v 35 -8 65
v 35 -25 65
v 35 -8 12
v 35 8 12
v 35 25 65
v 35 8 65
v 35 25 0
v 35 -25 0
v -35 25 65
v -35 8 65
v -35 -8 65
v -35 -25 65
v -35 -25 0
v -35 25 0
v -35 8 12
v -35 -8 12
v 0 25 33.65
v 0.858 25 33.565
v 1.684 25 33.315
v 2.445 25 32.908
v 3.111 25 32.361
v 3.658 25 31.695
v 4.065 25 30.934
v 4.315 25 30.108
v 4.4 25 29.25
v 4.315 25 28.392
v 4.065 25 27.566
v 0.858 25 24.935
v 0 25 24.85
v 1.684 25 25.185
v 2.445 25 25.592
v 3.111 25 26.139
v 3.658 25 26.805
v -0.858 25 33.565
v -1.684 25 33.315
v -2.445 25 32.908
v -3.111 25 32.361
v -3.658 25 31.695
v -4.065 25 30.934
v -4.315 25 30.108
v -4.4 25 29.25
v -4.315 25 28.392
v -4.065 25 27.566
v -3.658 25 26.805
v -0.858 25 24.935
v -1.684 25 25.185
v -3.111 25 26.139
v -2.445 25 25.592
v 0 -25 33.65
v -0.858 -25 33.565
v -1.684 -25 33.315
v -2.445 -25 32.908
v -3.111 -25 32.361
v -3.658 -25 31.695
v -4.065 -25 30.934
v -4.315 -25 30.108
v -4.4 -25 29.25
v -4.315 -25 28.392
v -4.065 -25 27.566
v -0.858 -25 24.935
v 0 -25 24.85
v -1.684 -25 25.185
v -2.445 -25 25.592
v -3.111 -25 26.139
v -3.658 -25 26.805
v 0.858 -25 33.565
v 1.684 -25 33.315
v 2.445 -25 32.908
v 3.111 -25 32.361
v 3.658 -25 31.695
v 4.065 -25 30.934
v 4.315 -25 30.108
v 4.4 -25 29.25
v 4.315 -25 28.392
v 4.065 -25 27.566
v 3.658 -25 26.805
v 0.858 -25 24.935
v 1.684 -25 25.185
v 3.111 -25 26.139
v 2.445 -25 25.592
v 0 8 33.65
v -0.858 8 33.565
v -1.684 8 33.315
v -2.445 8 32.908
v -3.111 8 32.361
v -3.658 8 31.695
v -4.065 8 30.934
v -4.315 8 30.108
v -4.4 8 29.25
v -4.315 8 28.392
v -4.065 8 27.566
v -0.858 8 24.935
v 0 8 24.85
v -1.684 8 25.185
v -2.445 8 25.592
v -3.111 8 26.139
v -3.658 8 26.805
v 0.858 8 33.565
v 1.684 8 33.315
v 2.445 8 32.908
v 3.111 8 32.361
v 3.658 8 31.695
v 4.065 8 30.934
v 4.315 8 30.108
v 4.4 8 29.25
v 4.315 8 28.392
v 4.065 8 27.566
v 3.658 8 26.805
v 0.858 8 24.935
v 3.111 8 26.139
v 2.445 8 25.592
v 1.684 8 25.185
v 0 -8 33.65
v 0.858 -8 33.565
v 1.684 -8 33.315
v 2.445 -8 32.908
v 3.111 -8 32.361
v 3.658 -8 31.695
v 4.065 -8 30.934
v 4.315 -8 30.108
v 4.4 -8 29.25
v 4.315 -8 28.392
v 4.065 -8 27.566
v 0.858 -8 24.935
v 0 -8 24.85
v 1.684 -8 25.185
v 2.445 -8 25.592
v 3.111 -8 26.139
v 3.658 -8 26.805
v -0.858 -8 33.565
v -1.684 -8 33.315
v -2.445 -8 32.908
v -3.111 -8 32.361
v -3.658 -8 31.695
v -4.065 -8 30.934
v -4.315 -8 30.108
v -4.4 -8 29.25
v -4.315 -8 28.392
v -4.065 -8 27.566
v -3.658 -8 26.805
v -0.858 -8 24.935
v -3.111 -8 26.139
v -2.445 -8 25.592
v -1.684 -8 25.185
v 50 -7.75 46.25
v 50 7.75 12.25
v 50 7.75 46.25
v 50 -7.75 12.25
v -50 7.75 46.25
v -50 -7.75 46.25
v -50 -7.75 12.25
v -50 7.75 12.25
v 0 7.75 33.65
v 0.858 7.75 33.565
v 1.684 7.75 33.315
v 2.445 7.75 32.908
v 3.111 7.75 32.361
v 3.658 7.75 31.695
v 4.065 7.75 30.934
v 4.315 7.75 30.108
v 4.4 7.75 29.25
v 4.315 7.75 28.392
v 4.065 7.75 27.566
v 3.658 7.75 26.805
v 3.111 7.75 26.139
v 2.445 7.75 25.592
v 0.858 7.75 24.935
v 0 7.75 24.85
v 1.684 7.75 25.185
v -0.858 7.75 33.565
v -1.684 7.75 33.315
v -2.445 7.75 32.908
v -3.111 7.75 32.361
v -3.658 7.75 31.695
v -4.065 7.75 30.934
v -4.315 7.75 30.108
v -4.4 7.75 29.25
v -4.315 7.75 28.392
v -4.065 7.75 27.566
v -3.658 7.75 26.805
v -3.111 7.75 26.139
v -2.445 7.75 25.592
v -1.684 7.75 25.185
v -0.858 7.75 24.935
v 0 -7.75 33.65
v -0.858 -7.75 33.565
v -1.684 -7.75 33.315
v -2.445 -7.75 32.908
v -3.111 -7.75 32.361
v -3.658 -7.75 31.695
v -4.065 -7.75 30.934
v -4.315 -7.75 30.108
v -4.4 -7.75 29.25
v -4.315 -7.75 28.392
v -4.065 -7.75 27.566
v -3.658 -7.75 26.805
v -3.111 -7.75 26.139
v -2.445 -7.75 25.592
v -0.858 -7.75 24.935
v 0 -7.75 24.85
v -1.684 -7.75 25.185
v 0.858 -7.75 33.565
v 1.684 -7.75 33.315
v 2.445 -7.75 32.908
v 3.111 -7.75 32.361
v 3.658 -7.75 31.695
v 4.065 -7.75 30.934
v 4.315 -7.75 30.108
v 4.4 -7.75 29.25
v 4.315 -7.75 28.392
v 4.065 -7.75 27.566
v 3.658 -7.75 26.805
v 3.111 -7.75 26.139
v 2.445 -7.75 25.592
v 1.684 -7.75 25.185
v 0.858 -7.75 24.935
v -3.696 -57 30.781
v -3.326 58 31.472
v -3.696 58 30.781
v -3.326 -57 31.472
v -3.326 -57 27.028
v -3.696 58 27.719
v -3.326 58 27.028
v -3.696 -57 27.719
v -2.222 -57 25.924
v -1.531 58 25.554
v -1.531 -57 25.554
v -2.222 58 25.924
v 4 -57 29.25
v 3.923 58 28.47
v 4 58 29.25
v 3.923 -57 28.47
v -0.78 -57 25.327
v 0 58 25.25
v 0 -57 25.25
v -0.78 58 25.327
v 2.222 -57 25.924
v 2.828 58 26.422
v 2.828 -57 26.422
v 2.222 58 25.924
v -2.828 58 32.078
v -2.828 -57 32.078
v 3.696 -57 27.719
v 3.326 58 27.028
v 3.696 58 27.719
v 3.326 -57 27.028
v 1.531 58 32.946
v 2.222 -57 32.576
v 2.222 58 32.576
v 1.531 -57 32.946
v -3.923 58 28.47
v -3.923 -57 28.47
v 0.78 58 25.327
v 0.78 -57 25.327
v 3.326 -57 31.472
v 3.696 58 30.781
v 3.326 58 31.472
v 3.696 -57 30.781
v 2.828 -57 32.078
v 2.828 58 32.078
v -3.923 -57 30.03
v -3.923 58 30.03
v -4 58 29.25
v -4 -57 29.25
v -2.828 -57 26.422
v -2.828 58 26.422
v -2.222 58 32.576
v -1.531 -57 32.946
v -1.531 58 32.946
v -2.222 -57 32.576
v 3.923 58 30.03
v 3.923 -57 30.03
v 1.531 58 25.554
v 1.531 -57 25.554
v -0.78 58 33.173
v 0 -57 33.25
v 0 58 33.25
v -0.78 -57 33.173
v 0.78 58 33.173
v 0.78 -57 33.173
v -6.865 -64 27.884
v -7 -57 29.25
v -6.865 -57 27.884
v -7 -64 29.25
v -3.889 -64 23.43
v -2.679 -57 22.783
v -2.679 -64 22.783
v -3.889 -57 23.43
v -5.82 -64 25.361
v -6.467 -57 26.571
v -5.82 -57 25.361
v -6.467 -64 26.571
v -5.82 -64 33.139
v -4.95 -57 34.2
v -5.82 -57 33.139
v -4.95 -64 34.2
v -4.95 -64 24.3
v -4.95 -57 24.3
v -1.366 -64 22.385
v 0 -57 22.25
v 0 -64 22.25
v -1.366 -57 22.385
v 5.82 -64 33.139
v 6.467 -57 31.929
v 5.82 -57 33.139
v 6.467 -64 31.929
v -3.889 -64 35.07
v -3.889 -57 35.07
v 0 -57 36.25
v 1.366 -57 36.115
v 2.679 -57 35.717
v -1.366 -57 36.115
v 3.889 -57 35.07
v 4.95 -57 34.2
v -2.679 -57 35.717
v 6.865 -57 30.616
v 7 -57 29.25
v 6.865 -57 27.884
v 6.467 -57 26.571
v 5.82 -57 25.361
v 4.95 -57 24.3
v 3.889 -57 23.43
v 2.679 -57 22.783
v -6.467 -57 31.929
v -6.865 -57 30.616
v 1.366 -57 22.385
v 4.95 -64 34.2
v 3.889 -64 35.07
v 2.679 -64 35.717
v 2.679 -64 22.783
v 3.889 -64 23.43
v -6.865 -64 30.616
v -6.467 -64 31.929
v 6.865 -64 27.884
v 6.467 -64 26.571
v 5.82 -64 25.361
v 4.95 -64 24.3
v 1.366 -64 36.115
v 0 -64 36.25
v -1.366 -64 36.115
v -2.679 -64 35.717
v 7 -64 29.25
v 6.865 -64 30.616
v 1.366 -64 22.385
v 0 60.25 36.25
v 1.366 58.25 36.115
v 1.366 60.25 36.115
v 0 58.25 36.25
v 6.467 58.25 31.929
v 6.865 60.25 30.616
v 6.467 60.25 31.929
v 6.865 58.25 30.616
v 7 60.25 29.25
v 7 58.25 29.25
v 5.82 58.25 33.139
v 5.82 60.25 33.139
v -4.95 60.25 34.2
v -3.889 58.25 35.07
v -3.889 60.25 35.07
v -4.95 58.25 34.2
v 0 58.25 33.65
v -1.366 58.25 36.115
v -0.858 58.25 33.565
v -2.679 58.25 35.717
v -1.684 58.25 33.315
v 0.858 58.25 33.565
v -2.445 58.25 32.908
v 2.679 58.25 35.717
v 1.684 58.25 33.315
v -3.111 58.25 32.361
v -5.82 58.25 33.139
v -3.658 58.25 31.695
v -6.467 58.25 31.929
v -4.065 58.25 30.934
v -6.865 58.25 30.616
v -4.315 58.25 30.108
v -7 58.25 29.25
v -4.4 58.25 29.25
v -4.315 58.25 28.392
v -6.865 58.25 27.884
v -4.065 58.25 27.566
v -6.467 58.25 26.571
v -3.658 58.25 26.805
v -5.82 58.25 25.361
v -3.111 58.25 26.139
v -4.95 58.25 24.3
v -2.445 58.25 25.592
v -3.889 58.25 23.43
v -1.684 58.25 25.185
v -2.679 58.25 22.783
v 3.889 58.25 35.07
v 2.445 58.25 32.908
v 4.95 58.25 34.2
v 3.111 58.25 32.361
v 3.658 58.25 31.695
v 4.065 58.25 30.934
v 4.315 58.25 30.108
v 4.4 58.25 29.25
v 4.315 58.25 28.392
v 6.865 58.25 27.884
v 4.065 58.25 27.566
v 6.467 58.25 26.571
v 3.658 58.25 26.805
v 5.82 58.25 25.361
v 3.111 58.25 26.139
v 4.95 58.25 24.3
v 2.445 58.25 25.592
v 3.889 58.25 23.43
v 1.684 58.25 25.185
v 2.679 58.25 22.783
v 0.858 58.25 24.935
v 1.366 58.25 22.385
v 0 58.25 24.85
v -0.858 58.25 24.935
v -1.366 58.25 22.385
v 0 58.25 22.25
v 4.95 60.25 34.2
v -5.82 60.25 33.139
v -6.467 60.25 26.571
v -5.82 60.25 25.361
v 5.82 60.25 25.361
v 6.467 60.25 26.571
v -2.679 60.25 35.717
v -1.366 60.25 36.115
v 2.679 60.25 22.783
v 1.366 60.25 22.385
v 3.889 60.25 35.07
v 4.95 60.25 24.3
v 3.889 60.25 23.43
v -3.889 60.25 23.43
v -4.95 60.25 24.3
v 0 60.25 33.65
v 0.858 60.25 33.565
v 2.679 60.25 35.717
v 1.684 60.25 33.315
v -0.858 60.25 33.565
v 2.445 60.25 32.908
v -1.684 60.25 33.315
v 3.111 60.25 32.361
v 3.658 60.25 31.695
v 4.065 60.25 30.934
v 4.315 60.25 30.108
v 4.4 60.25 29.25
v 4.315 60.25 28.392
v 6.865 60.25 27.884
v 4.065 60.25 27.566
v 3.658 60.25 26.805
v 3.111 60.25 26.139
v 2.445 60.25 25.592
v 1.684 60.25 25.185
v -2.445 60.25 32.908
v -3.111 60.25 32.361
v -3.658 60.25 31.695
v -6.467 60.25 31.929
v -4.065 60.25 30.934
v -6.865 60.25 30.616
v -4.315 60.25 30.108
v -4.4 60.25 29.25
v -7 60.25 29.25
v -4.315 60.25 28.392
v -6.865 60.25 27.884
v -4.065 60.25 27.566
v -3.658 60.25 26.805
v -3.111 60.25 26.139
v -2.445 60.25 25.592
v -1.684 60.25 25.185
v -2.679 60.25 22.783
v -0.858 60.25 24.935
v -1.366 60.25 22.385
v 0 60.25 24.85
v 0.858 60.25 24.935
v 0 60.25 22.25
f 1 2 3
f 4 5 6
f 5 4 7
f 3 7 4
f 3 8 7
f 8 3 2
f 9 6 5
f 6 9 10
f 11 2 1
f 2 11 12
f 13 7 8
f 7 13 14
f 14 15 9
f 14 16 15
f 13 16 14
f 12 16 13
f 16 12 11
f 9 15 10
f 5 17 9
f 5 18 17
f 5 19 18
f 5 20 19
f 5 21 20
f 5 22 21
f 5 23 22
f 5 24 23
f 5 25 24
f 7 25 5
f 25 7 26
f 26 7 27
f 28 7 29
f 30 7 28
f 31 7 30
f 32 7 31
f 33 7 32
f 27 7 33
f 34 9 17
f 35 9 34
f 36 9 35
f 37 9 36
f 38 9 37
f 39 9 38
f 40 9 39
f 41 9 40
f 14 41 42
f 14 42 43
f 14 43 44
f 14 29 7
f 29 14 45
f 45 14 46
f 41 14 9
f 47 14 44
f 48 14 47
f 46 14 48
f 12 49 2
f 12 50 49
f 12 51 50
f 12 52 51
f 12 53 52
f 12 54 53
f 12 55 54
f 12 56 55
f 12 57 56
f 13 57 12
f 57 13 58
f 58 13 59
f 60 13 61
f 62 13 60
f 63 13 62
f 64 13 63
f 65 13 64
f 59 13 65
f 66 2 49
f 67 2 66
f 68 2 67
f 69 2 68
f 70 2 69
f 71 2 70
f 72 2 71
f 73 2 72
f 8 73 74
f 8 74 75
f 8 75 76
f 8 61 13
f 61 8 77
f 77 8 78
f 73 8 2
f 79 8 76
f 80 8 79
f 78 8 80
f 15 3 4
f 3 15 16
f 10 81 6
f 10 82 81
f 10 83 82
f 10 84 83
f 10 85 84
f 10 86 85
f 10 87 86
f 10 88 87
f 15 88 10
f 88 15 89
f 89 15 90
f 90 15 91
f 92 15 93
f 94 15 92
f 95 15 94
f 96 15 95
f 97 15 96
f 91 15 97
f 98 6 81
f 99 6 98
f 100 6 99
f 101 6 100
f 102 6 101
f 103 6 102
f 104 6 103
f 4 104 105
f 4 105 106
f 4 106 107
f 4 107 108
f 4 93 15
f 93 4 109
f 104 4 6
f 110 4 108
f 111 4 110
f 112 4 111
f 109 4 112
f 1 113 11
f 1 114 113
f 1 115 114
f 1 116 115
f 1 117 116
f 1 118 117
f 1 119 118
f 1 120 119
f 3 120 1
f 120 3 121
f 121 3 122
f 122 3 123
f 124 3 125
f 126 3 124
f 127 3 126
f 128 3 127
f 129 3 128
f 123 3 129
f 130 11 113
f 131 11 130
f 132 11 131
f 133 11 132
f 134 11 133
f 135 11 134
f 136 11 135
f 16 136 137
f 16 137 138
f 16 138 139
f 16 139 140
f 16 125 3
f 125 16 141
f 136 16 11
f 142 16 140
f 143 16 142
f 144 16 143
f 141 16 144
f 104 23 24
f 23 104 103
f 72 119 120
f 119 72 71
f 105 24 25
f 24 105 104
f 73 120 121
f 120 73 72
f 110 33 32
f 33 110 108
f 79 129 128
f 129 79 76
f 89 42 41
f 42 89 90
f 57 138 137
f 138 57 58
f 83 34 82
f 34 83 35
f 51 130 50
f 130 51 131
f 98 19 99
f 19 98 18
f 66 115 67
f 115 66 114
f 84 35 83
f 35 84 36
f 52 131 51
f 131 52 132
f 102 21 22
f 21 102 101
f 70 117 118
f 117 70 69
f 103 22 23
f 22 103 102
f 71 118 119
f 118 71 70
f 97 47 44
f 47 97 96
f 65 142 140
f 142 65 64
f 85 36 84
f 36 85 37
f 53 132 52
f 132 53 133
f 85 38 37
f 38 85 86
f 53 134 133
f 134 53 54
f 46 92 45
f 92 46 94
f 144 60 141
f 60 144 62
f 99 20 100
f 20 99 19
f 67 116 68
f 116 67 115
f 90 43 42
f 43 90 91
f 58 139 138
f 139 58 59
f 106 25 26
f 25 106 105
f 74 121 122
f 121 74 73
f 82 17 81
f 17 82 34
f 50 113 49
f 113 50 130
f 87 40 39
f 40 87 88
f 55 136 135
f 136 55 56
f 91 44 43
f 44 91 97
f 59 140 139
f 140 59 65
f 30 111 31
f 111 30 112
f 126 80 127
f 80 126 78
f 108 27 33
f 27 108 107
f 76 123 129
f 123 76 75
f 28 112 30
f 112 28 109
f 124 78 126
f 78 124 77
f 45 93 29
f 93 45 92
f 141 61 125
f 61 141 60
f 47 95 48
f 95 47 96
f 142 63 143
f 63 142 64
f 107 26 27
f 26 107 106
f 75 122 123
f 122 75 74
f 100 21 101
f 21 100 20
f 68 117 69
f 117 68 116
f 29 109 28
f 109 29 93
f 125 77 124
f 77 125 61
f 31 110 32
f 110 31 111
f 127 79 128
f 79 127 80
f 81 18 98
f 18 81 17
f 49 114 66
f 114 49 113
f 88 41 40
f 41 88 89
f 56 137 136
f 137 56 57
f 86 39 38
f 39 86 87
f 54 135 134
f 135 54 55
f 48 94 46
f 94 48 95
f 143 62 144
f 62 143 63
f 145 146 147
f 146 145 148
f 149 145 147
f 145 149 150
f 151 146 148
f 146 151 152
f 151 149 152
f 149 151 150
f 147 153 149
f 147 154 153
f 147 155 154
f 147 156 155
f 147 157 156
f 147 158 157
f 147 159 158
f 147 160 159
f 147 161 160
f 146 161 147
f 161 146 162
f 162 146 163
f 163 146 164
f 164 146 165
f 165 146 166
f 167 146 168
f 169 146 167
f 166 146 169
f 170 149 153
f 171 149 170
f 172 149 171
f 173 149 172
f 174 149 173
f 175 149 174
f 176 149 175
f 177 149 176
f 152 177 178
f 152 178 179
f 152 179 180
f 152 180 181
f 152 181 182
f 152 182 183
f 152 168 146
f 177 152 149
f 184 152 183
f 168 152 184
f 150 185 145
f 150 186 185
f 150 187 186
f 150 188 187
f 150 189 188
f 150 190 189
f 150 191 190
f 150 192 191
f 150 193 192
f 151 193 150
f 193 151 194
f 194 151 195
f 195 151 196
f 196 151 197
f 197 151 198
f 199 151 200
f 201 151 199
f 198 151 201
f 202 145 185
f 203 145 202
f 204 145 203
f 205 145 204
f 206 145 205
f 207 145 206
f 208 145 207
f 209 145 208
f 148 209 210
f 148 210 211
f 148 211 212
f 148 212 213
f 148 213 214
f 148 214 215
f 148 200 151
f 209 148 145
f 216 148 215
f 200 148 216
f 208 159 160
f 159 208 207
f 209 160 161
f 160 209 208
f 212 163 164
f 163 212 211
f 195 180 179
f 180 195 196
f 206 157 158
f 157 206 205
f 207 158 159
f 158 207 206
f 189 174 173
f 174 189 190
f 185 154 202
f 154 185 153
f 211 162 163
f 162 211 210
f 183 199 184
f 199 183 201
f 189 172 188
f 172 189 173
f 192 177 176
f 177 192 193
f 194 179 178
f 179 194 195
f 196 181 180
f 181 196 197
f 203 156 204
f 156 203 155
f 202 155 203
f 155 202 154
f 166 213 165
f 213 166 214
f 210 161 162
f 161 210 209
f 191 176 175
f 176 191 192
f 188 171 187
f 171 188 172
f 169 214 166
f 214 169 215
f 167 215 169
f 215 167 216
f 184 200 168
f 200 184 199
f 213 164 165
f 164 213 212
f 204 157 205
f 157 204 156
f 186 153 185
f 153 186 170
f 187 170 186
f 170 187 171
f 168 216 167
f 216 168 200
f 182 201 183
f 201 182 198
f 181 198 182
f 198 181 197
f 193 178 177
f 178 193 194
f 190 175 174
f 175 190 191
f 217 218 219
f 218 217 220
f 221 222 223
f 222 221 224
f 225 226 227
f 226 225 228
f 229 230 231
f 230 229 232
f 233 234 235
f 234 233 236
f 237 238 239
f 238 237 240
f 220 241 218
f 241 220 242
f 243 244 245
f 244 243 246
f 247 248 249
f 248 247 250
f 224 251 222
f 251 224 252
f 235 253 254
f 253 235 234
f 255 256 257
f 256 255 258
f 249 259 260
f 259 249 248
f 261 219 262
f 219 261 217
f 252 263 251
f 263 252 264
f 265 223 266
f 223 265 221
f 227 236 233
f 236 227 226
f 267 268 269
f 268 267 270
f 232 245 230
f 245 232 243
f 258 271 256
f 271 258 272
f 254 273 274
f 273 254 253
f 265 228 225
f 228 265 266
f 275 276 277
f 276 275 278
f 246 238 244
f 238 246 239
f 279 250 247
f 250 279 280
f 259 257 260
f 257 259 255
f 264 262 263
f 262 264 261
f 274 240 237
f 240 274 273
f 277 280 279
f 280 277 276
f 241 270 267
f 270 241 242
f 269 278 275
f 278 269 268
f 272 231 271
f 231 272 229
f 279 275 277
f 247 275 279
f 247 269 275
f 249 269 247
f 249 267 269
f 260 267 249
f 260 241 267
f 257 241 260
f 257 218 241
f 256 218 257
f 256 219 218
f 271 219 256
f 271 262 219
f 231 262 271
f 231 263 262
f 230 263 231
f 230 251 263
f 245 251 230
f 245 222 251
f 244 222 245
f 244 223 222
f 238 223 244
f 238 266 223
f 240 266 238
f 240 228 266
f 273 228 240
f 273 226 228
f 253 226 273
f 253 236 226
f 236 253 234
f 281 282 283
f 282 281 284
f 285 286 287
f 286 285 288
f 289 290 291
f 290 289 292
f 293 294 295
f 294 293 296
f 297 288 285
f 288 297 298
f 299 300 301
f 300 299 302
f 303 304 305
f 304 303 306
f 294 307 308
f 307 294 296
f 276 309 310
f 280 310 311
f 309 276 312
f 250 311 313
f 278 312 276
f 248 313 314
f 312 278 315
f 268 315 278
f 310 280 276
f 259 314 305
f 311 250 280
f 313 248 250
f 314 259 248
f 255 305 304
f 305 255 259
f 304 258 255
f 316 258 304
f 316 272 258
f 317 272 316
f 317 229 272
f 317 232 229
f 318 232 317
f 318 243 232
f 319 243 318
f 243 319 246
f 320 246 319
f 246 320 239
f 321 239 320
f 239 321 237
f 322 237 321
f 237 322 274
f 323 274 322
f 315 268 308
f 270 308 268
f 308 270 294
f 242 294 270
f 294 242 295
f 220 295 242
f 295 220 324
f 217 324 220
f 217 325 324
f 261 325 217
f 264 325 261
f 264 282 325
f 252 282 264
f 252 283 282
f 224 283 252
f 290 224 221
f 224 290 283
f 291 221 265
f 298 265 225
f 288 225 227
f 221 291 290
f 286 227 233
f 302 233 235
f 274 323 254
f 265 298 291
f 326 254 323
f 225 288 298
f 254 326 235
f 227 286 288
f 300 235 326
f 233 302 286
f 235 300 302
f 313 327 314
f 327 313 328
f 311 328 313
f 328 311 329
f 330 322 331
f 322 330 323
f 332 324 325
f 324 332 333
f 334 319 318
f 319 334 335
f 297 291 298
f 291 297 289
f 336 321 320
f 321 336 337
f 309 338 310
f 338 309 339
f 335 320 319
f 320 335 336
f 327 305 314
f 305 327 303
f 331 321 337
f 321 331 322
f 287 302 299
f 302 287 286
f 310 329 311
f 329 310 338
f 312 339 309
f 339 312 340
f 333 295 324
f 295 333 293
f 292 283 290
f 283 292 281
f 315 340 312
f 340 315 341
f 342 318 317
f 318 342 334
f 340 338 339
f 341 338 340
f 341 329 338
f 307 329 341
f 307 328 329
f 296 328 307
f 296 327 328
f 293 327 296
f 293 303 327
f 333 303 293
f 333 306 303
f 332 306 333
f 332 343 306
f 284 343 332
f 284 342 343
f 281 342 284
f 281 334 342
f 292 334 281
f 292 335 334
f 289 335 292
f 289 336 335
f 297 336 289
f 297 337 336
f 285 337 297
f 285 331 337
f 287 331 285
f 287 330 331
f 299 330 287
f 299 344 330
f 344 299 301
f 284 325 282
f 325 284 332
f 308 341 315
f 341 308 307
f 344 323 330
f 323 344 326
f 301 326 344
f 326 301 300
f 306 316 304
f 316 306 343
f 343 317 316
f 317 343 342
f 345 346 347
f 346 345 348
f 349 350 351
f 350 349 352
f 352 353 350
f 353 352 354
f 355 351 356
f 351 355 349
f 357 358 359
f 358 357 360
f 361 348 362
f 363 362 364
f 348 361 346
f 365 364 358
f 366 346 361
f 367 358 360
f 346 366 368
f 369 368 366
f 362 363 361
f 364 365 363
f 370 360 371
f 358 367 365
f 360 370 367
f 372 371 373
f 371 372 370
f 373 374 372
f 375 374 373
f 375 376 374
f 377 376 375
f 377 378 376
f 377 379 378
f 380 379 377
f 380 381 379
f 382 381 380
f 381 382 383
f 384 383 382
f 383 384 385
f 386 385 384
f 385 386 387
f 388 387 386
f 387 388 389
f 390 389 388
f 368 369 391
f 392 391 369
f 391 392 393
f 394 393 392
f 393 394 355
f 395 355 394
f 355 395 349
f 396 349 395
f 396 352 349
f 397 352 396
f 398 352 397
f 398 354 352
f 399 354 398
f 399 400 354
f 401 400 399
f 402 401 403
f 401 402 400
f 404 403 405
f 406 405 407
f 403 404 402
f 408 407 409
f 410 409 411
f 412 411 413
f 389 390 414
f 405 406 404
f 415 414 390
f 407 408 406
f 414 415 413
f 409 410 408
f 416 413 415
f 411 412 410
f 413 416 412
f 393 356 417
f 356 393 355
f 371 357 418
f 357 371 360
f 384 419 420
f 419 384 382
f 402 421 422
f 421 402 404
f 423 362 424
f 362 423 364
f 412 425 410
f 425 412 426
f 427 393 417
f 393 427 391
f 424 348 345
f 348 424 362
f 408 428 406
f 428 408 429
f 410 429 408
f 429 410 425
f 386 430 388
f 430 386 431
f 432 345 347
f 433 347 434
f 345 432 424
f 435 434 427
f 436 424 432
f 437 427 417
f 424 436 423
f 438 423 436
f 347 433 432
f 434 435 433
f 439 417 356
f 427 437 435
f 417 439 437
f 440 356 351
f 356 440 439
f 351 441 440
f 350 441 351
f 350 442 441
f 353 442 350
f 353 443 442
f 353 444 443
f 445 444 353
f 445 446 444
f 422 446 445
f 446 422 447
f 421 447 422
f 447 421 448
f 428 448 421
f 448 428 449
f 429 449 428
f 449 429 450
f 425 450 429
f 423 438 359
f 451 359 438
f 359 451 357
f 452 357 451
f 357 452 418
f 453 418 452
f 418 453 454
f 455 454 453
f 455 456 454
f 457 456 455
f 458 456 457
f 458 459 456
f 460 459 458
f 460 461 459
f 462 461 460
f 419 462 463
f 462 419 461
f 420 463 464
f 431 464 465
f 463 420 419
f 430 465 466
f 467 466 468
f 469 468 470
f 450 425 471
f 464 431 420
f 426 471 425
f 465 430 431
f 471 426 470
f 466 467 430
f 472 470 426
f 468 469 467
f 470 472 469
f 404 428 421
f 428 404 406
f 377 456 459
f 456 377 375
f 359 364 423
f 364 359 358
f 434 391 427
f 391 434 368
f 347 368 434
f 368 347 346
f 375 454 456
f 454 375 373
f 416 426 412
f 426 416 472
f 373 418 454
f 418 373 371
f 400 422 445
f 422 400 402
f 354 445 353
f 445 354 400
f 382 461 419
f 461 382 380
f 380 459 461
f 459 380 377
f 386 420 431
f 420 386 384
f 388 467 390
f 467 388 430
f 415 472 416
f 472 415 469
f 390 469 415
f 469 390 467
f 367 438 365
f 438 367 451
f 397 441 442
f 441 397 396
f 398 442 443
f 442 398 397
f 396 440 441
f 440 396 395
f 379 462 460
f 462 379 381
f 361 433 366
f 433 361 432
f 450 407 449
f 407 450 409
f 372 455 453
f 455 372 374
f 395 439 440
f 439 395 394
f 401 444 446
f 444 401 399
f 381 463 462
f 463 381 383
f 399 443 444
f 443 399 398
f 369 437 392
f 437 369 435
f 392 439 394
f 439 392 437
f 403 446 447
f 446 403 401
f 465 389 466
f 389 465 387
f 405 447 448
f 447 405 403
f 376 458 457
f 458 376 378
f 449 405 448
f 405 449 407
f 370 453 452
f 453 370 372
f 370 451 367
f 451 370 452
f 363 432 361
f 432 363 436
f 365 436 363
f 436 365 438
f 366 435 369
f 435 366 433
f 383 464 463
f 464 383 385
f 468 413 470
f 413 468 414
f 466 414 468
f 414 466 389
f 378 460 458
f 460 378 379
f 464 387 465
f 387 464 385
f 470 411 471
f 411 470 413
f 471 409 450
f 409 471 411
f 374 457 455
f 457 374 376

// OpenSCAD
$fn = 32;

// ------------------------------------------------------------------------
// Clevis joint: 70 mm clevis, pin d8
// Every part is its own module, assembly() places them once.
// ------------------------------------------------------------------------

// --- part 1 ---
module clevis() {
  difference() {
    translate([-35, -25, 0]) cube([70, 50, 65]);
    translate([-36, -8, 12]) cube([72, 16, 54]);
    translate([0, 0, 29.25]) rotate([90, 0, 0]) cylinder(h = 52, d = 8.8, center = true);
  }
}

// --- part 2 ---
module eye() {
  difference() {
    translate([-50, -7.75, 0]) cube([100, 15.5, 34]);
    translate([0, 0, 17]) rotate([90, 0, 0]) cylinder(h = 17.5, d = 8.8, center = true);
  }
}

// --- part 3 ---
module pin() {
  rotate([0, 90, 0]) cylinder(h = 116, d = 8, center = true);
  translate([-64, 0, 0]) rotate([0, 90, 0]) cylinder(h = 7, d = 14);
}

// --- part 4 ---
module retainer() {
  difference() {
      translate([0, 0, 0]) cylinder(h = 2, d = 14);
      translate([0, 0, -1]) cylinder(h = 4, d = 8.8);
    }
}

// --- assembly ---
module assembly() {
  translate([0, 0, 0]) rotate([0, 0, 0]) clevis();
  translate([0, 0, 12.25]) rotate([0, 0, 0]) eye();
  translate([0, 0, 29.25]) rotate([0, 0, 90]) pin();
  translate([0, 60.25, 29.25]) rotate([90, 0, 0]) retainer();
}

assembly();
